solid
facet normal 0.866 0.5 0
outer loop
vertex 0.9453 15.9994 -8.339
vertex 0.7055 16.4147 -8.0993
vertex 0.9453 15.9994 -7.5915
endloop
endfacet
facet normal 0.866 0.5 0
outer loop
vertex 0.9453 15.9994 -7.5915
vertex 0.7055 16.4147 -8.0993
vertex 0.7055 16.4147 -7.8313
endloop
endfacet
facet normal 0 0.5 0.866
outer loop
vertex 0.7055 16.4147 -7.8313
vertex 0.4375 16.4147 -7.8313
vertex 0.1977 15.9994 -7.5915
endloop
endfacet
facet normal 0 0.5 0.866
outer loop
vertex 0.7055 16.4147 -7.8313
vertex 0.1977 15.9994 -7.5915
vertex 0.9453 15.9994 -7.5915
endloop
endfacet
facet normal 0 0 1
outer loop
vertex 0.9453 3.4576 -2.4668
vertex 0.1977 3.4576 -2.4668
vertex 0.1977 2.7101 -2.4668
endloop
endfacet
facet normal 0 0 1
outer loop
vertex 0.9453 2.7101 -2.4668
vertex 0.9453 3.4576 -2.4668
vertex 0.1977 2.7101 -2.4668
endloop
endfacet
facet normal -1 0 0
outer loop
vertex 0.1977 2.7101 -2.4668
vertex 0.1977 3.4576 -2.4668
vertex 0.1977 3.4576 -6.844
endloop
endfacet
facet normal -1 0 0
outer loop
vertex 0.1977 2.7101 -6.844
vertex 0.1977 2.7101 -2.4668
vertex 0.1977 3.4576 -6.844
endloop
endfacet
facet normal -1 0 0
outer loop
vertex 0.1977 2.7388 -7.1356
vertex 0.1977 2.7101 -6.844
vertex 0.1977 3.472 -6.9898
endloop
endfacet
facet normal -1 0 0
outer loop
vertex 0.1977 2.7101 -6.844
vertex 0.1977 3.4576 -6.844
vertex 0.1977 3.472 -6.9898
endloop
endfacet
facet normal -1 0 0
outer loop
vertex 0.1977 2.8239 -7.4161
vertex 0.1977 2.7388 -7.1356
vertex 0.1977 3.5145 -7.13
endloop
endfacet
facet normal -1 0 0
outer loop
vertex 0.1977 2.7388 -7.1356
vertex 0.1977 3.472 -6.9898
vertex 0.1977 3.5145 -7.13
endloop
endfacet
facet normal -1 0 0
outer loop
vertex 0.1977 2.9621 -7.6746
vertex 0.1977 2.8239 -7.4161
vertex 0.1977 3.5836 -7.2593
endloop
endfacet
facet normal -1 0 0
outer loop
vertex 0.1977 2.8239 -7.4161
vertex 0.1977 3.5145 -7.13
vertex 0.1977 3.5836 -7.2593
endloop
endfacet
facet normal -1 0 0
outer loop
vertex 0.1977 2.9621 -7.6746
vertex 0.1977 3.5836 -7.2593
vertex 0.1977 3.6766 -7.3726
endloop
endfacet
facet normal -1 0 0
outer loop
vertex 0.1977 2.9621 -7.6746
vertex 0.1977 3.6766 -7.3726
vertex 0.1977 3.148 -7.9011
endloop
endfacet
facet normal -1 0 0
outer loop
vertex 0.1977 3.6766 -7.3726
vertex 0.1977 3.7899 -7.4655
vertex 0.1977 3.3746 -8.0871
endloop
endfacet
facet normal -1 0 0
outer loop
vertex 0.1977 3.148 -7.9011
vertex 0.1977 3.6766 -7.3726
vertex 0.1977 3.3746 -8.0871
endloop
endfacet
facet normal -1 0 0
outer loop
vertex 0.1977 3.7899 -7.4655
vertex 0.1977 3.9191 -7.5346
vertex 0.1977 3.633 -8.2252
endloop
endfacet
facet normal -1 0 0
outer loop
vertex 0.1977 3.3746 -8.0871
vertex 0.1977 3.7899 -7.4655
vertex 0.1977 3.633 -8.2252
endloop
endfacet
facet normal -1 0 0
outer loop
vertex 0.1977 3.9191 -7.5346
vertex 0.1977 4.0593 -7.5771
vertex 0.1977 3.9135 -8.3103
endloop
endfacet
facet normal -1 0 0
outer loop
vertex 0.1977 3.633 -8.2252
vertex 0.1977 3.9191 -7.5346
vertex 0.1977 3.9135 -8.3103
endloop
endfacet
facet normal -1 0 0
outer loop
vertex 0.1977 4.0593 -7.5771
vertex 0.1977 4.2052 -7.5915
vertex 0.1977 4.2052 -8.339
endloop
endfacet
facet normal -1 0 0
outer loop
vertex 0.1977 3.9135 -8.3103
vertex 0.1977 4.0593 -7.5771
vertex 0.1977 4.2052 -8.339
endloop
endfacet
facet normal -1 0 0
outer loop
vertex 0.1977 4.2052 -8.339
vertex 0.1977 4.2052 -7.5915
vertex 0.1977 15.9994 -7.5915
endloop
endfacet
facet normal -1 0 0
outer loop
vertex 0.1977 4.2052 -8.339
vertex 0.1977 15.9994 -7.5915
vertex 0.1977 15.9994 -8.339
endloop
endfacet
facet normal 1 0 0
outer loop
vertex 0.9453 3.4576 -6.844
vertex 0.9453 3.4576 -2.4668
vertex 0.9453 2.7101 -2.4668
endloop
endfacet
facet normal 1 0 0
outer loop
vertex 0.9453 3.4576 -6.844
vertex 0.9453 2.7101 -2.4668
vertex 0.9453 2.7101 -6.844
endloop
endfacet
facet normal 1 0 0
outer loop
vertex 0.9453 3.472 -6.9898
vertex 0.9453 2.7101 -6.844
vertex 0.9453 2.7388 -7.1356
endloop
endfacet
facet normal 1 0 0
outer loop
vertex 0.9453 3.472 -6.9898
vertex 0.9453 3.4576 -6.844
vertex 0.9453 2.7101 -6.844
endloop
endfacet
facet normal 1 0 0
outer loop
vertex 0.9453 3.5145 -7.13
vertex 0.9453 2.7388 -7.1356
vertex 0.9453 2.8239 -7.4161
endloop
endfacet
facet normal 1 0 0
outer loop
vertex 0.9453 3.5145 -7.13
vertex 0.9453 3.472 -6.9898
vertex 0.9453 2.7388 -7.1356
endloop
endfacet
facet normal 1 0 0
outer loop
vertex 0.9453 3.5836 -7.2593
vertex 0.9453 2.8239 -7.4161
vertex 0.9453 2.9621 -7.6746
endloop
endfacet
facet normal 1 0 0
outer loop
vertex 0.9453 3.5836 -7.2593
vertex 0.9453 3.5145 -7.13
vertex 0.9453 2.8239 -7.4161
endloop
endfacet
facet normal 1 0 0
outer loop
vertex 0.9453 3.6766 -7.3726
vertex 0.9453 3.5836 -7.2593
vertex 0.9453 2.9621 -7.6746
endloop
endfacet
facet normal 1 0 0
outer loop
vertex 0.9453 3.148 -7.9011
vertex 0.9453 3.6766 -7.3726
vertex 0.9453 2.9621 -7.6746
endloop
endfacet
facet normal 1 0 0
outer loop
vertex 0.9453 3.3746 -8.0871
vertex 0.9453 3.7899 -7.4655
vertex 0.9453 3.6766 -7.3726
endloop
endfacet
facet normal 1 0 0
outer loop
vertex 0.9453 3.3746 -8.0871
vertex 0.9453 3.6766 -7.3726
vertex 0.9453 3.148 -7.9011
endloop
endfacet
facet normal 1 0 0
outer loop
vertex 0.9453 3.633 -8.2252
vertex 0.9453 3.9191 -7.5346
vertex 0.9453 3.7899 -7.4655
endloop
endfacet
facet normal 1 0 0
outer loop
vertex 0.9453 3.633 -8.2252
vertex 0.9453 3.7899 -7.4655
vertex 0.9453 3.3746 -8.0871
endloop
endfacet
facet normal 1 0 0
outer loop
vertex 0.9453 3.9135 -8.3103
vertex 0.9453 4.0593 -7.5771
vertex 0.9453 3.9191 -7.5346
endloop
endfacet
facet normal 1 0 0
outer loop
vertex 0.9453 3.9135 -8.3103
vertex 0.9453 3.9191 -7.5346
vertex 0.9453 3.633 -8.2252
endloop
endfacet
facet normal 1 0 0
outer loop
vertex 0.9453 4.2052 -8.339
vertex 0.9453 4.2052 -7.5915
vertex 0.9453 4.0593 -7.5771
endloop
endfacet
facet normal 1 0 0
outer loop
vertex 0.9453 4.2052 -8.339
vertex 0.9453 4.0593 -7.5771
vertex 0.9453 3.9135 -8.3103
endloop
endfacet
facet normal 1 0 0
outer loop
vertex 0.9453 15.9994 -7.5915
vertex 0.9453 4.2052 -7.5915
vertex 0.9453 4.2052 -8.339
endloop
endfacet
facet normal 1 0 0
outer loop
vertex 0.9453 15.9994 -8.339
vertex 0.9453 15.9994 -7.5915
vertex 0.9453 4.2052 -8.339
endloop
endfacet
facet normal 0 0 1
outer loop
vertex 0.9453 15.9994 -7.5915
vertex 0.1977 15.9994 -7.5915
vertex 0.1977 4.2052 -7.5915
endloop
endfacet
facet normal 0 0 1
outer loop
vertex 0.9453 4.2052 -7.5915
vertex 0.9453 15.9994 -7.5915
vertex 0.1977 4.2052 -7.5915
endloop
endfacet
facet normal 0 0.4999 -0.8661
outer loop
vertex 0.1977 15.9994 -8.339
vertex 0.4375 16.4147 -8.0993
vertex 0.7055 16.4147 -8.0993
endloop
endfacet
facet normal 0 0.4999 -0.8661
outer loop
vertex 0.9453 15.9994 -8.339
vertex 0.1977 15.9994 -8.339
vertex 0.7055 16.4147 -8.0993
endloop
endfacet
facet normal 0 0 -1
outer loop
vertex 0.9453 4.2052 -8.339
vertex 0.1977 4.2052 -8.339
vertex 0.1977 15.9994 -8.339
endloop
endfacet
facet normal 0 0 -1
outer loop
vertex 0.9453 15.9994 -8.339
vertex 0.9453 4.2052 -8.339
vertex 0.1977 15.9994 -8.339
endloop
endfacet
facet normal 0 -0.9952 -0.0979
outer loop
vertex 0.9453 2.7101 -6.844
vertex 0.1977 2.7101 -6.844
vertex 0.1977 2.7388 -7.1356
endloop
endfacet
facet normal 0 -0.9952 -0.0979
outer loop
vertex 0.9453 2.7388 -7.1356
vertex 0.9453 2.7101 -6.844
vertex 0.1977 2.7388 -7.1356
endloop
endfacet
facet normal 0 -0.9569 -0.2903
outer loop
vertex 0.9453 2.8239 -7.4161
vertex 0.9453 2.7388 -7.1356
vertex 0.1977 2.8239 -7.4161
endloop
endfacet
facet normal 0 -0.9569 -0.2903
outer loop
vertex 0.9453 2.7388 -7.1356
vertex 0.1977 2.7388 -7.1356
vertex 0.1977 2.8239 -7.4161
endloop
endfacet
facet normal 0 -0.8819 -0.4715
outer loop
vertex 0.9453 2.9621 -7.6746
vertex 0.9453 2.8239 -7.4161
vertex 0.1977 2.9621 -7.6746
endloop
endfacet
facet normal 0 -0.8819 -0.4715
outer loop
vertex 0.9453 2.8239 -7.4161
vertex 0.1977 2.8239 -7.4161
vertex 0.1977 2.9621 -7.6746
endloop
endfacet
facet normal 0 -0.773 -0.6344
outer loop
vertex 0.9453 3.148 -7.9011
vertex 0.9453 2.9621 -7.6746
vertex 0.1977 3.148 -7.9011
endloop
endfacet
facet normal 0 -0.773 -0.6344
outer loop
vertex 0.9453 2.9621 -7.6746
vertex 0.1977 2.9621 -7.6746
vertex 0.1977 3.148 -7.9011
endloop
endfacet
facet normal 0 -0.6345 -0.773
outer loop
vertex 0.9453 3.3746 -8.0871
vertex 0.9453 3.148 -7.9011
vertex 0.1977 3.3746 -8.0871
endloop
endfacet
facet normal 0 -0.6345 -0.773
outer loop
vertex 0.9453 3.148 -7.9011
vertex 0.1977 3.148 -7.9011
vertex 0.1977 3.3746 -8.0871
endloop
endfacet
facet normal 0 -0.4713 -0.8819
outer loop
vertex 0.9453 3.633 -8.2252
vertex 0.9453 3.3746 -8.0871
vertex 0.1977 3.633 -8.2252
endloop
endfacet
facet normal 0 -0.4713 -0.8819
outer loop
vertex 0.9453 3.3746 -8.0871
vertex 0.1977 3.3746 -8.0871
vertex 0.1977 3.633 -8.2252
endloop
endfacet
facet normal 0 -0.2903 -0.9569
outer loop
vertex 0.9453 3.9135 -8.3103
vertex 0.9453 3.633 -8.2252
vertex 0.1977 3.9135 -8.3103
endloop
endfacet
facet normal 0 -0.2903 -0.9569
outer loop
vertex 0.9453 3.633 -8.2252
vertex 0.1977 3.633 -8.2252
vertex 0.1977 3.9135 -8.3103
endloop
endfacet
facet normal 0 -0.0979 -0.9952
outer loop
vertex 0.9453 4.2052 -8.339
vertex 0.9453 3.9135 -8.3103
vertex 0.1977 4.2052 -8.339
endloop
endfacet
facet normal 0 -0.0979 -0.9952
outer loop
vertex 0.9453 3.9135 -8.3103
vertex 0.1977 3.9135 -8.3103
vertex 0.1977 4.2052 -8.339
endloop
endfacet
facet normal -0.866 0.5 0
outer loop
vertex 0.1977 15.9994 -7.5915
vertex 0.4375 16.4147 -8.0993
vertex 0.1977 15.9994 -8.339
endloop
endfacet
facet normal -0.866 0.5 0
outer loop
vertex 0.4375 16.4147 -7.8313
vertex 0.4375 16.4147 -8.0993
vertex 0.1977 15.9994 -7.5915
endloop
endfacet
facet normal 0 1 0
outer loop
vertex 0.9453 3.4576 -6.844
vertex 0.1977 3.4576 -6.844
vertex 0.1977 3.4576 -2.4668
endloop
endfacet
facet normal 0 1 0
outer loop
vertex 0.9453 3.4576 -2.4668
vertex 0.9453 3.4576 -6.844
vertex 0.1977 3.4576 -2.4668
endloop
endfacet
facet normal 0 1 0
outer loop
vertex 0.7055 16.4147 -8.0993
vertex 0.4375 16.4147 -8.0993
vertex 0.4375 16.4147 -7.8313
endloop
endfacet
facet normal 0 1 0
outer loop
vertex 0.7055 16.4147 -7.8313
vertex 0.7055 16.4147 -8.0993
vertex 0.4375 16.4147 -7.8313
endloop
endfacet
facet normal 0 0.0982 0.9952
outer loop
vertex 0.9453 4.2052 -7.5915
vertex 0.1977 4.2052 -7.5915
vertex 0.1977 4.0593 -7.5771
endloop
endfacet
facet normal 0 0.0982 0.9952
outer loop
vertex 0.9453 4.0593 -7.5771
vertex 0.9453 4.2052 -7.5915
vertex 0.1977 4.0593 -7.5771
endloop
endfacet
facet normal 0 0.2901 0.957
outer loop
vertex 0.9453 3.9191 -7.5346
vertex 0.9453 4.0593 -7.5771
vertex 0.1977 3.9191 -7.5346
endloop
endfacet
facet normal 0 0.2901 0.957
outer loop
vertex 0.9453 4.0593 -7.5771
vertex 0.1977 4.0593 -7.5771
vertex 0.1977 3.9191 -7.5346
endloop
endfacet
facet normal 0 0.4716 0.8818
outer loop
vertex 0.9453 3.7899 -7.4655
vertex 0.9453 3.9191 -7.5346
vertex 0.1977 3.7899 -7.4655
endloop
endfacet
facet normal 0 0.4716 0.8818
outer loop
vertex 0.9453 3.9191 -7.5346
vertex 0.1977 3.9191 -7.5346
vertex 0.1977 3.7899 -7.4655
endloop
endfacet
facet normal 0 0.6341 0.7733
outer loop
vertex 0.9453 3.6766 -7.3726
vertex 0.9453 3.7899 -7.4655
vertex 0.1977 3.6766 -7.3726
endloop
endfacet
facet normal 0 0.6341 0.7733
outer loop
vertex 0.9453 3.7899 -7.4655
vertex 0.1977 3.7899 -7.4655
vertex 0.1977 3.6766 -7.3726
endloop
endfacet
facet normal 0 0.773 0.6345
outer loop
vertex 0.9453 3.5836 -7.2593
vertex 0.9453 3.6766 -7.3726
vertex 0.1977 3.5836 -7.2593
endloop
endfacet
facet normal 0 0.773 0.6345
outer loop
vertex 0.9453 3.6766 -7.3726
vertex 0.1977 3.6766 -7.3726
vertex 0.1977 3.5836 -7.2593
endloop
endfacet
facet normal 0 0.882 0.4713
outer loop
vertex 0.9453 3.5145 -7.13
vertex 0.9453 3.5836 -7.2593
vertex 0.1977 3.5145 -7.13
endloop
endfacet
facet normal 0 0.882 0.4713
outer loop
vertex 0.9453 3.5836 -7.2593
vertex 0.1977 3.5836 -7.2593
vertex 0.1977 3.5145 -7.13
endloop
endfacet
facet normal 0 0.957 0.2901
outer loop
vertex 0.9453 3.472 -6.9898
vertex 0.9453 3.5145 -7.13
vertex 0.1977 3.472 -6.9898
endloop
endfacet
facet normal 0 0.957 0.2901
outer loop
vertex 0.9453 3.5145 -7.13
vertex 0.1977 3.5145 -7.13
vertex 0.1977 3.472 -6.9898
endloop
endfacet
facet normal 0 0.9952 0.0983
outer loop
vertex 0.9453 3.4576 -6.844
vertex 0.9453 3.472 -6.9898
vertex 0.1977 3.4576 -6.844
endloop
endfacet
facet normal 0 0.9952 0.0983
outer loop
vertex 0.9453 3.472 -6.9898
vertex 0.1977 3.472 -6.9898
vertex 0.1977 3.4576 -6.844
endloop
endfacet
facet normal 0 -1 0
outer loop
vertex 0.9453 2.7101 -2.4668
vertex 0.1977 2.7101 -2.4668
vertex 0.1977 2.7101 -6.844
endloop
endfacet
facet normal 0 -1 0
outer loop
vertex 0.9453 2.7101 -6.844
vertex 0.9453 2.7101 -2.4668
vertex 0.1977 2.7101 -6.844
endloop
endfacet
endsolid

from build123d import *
from OCP.BRepFilletAPI import BRepFilletAPI_MakeChamfer

# Parameters (mm, degrees)
BOSS_EXTRUDE1_DEPTH = 1.143
CHAMFER1_SIZE       = 0.635
CHAMFER1_SIZE2      = 0.366617421
SCALE1_SCALE        = 0.654


with BuildPart() as part:
    # Sketch1 → Boss-Extrude1 (new body)
    with BuildSketch(Plane(origin=(0, 0, 0), x_dir=(0, 0, -1), z_dir=(1, 0, 0))):
        with BuildLine():
            Line((8.9789, 2.286), (8.9789, 20.955))
            Line((8.9789, 20.955), (7.8359, 20.955))
            Line((7.8359, 20.955), (7.8359, 2.286))
            ThreePointArc((7.8359, 2.286), (7.501123051, 1.477776949), (6.6929, 1.143))
            Line((6.6929, 1.143), (0, 1.143))
            Line((0, 1.143), (0, 0))
            Line((0, 0), (6.6929, 0))
            ThreePointArc((6.6929, 0), (8.309346102, 0.669553898), (8.9789, 2.286))
        make_face()
    extrude(amount=BOSS_EXTRUDE1_DEPTH)

    # Chamfer1: one chamfer whose edges measure the first distance from different faces: ONE call of the kernel's chamfer builder (chamfer() names one face for all edges)
    chamfer1_edges_1 = [part.edges().sort_by_distance(p)[0] for p in [
        (0.5715, 20.955, -7.8359),
    ]]
    chamfer1_side_1 = [part.faces().sort_by_distance(p)[0] for p in [
        (0.5715, 11.6205, -7.8359),
    ]]
    chamfer1_edges_2 = [part.edges().sort_by_distance(p)[0] for p in [
        (0.5715, 20.955, -8.9789),
    ]]
    chamfer1_side_2 = [part.faces().sort_by_distance(p)[0] for p in [
        (0.5715, 11.6205, -8.9789),
    ]]
    chamfer1_edges_3 = [part.edges().sort_by_distance(p)[0] for p in [
        (1.143, 20.955, -8.4074),
    ]]
    chamfer1_side_3 = [part.faces().sort_by_distance(p)[0] for p in [
        (1.143, 0.8307576, -8.1481424),
    ]]
    chamfer1_edges_4 = [part.edges().sort_by_distance(p)[0] for p in [
        (0, 20.955, -8.4074),
    ]]
    chamfer1_side_4 = [part.faces().sort_by_distance(p)[0] for p in [
        (0, 0.8307576, -8.1481424),
    ]]
    chamfer1 = BRepFilletAPI_MakeChamfer(part.part.solid().wrapped)
    for e in chamfer1_edges_1:
        chamfer1.Add(CHAMFER1_SIZE, CHAMFER1_SIZE2, e.wrapped, chamfer1_side_1[0].wrapped)  # the first distance lies on this face
    for e in chamfer1_edges_2:
        chamfer1.Add(CHAMFER1_SIZE, CHAMFER1_SIZE2, e.wrapped, chamfer1_side_2[0].wrapped)  # the first distance lies on this face
    for e in chamfer1_edges_3:
        chamfer1.Add(CHAMFER1_SIZE, CHAMFER1_SIZE2, e.wrapped, chamfer1_side_3[0].wrapped)  # the first distance lies on this face
    for e in chamfer1_edges_4:
        chamfer1.Add(CHAMFER1_SIZE, CHAMFER1_SIZE2, e.wrapped, chamfer1_side_4[0].wrapped)  # the first distance lies on this face
    add(Compound.cast(chamfer1.Shape()), mode=Mode.REPLACE)


with BuildPart() as part_1:
    # Scale1: scaled about (0.5715, 7.832685678, -7.129530876)
    add(part.part.scale(SCALE1_SCALE).moved(Location((0.197739, 2.710109245, -2.466817683))))


solid = part_1.part
